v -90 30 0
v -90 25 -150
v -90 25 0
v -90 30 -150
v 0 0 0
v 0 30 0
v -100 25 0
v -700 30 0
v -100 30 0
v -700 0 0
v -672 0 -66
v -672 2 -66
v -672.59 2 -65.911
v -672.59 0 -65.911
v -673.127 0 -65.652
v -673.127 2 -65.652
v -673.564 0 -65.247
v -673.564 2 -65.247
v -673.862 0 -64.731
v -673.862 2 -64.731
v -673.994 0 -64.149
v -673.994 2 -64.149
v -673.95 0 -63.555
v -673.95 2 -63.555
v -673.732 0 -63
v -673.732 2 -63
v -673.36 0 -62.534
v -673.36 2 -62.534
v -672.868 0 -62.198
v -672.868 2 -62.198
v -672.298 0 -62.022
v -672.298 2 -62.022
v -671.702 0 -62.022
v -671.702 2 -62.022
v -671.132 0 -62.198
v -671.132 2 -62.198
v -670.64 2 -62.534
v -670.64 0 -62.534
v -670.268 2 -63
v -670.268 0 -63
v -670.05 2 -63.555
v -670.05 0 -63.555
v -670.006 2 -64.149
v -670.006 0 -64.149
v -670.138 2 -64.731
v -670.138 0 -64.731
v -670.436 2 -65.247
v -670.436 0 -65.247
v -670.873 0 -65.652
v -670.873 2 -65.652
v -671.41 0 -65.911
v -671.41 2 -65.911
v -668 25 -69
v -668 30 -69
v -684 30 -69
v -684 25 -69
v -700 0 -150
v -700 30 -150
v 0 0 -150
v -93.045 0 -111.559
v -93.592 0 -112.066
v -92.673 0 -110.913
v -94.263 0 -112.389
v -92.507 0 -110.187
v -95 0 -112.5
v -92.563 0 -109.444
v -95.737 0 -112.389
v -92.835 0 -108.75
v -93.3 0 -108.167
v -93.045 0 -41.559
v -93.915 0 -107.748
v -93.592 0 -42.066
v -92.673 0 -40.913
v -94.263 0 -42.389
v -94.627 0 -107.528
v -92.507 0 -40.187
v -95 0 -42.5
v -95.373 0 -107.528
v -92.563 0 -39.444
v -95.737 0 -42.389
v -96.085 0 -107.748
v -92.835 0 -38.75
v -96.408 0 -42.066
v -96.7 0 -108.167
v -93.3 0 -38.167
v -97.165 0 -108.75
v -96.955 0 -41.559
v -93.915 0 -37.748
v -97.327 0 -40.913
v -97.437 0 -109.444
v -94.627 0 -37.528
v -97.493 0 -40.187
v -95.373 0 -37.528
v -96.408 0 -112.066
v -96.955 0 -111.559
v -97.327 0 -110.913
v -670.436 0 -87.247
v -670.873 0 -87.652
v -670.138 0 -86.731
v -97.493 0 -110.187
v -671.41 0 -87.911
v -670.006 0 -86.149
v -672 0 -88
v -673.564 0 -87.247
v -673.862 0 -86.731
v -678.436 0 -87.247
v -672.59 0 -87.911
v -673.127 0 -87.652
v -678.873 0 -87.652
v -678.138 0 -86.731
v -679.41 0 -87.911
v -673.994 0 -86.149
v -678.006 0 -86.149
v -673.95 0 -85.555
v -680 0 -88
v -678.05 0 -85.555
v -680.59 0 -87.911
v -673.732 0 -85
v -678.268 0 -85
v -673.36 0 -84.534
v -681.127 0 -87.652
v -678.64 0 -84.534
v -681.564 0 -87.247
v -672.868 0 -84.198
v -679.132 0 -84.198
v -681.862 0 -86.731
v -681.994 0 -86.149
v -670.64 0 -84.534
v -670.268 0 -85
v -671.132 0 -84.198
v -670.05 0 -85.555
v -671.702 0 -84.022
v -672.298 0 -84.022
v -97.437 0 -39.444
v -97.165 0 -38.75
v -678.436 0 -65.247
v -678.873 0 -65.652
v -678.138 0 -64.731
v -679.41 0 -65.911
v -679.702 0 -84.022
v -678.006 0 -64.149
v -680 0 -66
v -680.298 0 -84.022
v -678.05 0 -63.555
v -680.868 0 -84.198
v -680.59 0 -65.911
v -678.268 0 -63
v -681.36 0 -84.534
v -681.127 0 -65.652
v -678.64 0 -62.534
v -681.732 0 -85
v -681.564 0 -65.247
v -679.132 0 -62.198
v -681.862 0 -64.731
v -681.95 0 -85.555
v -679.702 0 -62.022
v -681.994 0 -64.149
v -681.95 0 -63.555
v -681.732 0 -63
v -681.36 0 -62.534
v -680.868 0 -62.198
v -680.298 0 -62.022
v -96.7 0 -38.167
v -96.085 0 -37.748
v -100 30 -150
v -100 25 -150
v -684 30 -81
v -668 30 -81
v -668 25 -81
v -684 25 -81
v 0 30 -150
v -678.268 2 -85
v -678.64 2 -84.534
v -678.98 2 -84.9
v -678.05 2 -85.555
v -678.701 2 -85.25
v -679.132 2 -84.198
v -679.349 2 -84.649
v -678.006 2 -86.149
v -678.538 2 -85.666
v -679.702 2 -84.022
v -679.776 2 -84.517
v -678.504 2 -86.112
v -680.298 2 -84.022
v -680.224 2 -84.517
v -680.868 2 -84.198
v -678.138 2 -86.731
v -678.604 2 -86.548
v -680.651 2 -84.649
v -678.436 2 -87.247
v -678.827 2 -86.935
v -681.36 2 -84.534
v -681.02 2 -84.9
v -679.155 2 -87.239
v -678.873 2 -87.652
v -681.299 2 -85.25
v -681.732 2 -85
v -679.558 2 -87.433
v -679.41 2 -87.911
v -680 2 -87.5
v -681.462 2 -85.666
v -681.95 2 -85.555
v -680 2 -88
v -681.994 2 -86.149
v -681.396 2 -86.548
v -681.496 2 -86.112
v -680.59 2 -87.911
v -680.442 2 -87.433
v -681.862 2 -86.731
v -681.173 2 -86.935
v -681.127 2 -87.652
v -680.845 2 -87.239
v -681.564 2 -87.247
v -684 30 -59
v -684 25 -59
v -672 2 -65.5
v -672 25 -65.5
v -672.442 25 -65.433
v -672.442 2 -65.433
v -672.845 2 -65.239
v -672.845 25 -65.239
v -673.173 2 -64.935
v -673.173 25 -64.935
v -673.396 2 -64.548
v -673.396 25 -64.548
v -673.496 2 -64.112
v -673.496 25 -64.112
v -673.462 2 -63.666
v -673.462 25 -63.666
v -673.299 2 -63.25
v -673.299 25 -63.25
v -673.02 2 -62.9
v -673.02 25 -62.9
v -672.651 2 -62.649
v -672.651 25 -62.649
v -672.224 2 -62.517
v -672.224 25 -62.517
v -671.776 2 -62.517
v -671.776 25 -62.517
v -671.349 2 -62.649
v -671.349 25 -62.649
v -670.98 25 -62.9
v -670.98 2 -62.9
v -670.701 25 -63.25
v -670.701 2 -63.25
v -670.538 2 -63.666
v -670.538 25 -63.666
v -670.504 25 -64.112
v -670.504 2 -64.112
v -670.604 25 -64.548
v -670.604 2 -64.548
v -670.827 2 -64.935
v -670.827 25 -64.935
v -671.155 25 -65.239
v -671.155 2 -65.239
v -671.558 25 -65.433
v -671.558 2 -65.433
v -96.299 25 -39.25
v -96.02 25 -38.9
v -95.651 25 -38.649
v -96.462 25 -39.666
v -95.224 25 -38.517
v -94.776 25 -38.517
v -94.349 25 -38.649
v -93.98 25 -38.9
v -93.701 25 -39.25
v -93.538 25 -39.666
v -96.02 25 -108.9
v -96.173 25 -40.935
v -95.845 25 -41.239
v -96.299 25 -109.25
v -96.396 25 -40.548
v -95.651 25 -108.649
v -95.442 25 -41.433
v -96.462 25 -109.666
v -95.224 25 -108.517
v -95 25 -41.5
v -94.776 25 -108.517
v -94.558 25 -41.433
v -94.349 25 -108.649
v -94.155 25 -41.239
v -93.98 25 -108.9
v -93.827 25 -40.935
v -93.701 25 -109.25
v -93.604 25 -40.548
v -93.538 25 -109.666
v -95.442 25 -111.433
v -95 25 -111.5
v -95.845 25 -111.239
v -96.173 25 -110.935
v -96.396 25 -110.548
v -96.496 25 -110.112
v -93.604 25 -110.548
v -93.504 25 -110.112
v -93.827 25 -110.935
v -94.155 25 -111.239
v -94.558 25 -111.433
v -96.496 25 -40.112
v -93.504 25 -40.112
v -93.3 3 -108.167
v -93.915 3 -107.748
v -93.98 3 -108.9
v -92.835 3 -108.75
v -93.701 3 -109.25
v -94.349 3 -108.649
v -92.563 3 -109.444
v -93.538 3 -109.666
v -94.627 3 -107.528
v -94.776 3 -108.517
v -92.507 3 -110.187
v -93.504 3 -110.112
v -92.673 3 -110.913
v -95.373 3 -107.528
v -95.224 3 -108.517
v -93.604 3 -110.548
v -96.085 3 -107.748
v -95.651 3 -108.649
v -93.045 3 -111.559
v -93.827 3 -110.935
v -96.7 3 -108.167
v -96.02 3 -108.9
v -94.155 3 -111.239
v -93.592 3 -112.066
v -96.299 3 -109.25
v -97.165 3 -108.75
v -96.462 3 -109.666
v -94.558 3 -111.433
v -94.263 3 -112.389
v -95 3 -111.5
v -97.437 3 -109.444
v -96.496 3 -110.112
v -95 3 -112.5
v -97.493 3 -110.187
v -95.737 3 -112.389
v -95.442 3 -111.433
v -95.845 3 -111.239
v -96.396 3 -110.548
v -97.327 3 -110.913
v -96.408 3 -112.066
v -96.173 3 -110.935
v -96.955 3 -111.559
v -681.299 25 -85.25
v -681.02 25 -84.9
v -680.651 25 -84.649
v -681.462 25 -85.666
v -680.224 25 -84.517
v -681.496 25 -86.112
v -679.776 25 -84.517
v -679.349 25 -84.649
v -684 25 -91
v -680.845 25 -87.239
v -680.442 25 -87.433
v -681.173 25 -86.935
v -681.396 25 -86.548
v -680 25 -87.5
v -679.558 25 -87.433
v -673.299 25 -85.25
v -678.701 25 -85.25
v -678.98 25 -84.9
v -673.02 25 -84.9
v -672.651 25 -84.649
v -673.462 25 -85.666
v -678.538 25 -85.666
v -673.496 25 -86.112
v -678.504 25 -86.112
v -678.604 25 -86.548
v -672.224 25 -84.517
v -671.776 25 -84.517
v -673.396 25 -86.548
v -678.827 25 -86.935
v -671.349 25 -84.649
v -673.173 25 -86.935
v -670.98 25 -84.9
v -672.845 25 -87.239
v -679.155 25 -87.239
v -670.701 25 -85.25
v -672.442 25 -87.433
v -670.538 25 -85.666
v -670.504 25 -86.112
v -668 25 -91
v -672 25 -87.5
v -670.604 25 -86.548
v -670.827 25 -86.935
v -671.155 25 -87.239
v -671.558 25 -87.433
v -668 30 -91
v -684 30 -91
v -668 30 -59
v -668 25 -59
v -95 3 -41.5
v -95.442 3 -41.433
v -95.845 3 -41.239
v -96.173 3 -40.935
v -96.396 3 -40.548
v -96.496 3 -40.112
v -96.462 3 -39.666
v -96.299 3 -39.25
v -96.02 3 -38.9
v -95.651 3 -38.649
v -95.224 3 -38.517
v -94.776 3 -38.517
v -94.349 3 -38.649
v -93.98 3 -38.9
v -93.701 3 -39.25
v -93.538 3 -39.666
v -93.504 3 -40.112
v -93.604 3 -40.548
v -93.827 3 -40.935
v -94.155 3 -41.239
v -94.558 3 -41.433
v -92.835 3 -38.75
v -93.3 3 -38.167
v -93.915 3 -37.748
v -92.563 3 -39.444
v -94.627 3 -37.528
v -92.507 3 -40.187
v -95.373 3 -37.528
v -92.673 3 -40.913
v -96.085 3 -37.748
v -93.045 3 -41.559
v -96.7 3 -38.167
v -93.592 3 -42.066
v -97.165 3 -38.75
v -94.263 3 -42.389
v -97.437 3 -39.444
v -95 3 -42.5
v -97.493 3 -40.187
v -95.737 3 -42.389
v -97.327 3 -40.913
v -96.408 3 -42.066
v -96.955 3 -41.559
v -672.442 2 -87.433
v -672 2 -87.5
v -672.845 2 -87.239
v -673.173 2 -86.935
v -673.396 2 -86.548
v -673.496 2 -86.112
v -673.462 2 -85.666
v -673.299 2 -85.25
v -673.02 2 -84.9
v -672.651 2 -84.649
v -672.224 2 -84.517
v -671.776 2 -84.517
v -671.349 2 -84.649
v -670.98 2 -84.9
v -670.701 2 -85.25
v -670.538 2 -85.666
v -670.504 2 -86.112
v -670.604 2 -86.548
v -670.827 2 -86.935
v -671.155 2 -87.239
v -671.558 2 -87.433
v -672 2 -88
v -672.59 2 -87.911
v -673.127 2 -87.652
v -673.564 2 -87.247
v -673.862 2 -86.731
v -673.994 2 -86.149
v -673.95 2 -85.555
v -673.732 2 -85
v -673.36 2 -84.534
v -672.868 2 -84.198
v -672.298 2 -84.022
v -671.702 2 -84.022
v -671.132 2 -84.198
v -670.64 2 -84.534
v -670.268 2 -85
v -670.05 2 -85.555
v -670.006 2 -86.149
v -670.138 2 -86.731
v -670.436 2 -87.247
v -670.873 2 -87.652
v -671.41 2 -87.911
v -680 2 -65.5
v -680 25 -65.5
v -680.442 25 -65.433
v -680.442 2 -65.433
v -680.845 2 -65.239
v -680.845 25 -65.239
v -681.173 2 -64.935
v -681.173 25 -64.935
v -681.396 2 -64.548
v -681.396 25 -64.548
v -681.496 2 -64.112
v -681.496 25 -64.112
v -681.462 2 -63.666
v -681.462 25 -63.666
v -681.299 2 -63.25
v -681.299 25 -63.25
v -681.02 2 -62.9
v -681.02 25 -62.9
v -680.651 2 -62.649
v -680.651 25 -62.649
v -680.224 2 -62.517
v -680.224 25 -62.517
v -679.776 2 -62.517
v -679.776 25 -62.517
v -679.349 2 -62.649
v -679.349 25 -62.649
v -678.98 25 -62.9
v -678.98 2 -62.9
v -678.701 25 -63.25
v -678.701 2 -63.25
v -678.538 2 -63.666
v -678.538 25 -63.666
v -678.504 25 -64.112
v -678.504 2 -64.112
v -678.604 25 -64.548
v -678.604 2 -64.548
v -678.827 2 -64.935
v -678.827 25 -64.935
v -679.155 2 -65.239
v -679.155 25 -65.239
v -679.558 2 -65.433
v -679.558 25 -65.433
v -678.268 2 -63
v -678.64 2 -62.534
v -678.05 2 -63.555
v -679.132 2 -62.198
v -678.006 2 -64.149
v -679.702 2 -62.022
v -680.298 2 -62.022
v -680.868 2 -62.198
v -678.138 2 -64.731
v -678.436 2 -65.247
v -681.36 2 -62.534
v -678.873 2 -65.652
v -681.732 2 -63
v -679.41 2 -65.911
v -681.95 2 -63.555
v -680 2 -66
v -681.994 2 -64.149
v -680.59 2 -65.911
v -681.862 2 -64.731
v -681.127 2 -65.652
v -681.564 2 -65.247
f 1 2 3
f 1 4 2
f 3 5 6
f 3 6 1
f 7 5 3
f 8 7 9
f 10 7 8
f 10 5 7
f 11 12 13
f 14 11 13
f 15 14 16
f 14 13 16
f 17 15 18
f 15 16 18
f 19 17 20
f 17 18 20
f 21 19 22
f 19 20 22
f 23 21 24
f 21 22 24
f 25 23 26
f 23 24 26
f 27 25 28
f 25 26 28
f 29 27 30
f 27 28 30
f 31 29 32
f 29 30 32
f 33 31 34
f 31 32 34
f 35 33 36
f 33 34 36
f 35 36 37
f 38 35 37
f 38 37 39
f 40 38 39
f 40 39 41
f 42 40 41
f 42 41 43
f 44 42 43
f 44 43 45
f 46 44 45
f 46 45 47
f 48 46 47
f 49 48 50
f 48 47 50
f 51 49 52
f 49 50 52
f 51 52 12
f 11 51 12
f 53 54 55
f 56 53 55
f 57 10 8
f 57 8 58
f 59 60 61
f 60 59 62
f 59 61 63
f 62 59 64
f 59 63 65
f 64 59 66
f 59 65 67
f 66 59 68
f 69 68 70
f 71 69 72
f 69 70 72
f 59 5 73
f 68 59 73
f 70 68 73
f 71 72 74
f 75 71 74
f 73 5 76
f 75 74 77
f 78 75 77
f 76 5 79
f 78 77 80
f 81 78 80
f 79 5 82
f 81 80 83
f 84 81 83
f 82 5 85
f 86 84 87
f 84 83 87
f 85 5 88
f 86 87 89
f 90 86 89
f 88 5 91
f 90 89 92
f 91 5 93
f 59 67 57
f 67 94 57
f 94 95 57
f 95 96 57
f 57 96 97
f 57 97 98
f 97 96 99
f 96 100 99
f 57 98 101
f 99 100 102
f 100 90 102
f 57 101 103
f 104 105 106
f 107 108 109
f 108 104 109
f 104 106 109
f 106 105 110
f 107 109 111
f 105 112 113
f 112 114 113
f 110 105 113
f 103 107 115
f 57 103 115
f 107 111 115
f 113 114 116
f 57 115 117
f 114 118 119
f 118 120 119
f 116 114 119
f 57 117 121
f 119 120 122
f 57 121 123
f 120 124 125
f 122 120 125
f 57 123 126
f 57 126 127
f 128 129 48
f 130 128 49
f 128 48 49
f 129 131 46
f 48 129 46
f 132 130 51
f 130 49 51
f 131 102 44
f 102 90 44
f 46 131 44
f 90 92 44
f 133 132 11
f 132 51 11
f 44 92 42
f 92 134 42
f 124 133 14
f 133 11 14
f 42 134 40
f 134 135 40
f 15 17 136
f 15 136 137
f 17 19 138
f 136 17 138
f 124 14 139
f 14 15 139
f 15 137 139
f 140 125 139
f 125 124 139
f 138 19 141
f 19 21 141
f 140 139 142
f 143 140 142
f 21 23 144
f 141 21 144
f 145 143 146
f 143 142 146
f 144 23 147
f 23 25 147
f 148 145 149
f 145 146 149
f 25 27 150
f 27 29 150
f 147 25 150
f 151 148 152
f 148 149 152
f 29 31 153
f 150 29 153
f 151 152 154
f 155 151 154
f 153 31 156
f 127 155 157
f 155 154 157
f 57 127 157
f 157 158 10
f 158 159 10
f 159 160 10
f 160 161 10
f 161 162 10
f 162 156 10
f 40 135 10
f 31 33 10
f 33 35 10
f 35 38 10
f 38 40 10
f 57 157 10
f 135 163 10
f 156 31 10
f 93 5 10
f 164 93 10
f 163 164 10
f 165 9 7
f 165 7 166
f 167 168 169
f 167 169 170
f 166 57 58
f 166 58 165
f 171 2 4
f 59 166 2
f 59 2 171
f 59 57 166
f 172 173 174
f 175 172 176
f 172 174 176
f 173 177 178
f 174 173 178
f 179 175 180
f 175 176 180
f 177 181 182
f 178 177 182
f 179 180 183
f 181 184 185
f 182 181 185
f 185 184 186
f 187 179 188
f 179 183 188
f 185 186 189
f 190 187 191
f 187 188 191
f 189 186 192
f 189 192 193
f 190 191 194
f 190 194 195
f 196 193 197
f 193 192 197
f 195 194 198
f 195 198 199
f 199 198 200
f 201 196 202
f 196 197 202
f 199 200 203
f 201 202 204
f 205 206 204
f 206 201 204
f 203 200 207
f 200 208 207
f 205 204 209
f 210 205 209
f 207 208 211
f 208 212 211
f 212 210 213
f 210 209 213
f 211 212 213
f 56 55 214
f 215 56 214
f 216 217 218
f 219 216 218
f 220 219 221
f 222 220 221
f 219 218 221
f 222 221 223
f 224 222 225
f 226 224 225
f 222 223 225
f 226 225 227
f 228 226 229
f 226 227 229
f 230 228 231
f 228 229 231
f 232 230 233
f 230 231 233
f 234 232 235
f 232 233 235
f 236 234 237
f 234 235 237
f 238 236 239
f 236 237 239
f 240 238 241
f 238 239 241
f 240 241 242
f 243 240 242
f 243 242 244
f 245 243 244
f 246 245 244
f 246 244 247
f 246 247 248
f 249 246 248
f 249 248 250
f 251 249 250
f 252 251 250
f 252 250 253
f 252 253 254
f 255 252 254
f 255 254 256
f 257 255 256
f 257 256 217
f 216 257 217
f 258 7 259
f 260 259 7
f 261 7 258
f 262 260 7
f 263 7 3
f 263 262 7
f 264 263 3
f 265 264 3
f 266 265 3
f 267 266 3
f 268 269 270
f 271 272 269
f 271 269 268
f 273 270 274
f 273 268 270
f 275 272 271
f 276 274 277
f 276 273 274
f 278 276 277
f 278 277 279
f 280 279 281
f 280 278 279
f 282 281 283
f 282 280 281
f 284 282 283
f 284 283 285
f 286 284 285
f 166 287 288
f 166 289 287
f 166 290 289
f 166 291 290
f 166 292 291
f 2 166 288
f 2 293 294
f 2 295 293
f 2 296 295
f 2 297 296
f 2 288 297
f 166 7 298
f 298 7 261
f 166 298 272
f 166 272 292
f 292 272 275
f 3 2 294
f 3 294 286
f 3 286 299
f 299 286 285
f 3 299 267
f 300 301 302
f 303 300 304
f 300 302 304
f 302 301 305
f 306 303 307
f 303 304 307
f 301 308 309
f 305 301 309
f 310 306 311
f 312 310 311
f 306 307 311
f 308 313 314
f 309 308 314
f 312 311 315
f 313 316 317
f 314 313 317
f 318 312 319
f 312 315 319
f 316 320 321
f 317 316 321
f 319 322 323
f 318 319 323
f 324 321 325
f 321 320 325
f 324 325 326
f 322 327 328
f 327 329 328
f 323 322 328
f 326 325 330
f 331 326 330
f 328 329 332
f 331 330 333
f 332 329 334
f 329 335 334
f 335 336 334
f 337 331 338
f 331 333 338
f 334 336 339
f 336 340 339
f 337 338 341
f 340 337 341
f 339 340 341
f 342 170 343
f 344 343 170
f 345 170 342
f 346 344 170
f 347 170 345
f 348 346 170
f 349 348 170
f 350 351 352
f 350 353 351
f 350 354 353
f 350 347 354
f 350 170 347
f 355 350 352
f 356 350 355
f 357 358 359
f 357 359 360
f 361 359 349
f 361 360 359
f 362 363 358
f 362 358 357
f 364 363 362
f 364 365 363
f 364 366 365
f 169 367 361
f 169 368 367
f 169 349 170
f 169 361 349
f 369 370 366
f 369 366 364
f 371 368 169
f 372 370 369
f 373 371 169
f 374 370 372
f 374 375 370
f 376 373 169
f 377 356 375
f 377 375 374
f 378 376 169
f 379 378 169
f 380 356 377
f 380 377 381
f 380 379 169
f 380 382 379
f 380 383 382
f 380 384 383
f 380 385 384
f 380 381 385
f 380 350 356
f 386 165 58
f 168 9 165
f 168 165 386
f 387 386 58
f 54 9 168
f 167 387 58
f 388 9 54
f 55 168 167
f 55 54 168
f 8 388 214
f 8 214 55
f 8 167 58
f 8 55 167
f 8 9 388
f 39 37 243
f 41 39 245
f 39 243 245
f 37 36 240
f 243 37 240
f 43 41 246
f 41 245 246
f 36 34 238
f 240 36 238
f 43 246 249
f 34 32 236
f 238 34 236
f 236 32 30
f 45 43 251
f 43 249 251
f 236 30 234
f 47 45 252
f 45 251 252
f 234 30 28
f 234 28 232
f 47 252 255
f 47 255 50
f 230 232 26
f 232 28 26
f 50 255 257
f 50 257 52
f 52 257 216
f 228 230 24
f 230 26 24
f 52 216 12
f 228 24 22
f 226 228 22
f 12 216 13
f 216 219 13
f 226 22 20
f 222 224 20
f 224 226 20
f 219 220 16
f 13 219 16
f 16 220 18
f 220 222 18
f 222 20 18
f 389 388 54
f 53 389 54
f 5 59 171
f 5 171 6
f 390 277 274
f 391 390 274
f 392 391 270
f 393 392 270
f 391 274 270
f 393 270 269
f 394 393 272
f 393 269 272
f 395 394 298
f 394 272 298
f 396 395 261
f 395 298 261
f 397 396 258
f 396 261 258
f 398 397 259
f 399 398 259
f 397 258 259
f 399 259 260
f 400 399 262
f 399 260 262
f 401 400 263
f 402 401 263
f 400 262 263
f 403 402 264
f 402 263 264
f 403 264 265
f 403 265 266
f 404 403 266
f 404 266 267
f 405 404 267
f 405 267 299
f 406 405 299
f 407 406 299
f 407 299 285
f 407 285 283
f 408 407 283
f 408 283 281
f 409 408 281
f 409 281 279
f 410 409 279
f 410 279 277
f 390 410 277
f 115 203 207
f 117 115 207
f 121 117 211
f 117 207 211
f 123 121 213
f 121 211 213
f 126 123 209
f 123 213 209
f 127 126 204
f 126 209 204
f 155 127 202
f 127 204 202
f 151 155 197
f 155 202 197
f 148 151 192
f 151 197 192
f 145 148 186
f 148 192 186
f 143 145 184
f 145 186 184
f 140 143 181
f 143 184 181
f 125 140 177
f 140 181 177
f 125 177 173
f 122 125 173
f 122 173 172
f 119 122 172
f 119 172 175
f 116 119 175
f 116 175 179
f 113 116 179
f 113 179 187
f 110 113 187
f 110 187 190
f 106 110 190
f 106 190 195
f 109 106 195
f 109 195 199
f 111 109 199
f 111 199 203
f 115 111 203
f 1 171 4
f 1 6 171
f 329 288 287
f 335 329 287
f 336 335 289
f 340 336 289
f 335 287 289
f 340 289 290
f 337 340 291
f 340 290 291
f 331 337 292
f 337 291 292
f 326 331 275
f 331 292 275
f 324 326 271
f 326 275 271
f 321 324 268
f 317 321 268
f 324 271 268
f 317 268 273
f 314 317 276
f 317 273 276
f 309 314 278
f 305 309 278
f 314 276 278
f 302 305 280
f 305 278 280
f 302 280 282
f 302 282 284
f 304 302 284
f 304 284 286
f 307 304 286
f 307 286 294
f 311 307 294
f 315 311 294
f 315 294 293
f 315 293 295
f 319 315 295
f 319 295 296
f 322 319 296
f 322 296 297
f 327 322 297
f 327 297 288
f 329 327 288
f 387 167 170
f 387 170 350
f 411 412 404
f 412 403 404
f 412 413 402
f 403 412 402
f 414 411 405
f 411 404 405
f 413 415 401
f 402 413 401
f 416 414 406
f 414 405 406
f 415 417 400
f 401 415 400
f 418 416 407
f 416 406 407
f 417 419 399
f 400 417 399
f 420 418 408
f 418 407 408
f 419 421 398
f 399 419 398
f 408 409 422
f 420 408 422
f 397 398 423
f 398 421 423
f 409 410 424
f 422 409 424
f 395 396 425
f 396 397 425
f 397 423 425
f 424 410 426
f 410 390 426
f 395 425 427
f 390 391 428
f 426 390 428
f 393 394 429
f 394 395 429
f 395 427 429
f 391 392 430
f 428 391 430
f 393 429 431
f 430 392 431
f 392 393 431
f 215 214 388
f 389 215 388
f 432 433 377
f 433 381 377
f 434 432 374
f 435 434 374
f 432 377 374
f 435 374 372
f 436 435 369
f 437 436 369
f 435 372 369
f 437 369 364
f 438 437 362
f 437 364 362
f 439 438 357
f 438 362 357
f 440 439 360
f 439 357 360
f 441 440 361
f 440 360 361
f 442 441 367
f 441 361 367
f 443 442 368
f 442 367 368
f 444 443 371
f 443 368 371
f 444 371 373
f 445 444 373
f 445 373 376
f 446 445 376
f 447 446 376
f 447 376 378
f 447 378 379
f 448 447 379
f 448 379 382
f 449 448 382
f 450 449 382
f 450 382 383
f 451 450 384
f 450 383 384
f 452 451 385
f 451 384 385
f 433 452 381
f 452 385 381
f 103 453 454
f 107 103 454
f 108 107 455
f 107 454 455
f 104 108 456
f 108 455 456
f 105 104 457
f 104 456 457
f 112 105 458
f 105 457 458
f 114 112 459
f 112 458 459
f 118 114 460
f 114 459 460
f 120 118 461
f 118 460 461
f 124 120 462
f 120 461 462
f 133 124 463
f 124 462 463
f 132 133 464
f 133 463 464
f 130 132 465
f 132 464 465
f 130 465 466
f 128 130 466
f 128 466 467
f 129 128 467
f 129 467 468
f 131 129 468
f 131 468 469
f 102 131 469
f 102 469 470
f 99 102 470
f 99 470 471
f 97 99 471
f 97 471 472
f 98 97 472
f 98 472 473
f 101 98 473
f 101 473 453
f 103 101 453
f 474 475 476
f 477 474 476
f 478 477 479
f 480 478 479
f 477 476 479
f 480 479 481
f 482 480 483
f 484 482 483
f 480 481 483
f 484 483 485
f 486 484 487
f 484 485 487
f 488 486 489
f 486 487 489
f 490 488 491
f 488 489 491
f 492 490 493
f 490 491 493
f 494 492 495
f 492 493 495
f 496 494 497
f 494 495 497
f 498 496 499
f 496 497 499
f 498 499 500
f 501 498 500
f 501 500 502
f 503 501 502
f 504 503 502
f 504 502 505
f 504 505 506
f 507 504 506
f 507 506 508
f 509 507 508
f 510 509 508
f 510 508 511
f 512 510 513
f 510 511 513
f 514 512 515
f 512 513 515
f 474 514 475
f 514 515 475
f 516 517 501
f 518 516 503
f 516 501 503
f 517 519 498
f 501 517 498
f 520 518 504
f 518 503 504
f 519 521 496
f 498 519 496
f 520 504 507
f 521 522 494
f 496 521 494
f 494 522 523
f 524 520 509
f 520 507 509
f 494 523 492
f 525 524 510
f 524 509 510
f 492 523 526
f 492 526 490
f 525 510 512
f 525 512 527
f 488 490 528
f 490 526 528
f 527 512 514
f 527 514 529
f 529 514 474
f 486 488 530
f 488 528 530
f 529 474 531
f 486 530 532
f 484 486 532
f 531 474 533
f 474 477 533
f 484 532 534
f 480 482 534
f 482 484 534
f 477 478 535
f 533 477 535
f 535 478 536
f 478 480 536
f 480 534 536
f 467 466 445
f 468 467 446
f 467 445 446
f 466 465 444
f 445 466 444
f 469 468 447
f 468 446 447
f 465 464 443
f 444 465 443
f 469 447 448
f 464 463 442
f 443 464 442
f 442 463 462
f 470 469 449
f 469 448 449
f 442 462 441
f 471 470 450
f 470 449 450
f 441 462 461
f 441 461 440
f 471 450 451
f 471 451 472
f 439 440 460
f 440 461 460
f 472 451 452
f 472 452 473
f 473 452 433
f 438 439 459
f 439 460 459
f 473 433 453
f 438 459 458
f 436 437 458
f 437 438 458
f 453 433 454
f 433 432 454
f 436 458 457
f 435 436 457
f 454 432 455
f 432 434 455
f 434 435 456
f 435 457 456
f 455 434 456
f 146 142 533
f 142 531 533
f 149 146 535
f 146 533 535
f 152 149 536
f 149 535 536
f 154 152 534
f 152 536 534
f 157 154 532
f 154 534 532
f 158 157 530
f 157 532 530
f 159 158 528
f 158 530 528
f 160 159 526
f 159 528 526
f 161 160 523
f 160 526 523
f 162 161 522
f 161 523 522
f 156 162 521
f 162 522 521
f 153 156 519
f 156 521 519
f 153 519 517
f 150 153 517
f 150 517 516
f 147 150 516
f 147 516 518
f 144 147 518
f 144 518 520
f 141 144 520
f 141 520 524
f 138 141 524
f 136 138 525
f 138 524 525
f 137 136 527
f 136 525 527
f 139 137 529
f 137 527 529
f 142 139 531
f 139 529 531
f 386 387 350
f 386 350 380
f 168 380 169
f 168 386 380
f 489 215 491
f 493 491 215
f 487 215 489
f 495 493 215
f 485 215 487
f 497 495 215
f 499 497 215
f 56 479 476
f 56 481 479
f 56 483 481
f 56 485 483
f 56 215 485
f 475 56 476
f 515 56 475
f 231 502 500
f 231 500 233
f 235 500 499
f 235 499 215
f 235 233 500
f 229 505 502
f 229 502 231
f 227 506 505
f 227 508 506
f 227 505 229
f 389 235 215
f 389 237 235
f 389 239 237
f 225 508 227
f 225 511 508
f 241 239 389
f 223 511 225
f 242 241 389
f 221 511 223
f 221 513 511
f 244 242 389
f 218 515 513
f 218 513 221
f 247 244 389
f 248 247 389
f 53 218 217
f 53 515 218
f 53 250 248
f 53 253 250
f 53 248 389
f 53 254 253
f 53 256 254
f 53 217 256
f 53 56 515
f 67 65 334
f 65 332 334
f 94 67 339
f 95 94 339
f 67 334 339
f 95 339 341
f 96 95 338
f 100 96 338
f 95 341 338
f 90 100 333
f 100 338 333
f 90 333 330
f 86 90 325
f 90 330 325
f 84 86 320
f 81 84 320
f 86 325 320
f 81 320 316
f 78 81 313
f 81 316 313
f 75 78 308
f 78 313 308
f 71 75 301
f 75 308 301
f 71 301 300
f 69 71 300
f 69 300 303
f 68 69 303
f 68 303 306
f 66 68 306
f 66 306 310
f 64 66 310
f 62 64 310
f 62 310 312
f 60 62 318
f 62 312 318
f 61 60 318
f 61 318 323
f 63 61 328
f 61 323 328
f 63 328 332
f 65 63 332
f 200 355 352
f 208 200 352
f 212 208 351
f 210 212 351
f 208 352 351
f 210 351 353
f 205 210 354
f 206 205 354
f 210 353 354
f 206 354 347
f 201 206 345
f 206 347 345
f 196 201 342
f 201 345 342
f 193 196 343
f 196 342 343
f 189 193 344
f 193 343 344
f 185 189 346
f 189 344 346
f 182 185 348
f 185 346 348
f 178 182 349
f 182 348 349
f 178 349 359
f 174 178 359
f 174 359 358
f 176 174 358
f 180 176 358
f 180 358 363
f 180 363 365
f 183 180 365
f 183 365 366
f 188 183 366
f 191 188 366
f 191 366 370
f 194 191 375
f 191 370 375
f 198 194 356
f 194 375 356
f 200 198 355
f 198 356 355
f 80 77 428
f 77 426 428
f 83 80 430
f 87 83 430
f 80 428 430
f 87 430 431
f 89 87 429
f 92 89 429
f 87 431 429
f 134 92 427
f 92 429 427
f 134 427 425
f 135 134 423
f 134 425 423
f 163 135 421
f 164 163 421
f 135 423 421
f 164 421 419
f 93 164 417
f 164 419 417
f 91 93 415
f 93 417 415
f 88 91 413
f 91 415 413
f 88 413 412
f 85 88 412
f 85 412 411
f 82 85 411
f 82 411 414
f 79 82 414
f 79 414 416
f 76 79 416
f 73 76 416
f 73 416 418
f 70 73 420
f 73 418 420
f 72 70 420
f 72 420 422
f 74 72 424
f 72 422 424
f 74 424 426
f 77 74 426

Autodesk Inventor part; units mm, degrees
ref_plane "YZ Plane" through (0, 0, 0) normal (1, 0, 0) x (0, 1, 0)
ref_plane "XZ Plane" through (0, 0, 0) normal (0, 1, 0) x (-1, 0, 0)
ref_plane "XY Plane" through (0, 0, 0) normal (0, 0, 1) x (1, 0, 0)
sketch "Sketch1" plane through (0, 0, 0) normal (0, 1, 0) x (-1, 0, 0)
  line L0 (0, 0) -> (700, 0)
  line L1 (700, 0) -> (700, -150)
  line L2 (700, -150) -> (0, -150)
  line L3 (0, -150) -> (0, 0)
  dimension "d0" = 700
  dimension "d1" = 150
extrude "Extrusion1" add sketch "Sketch1" along normal blind 30
sketch "Sketch2" plane through (0, 30, 0) normal (0, 1, 0) x (1, 0, 0)
  line L0 (-684, 59) -> (-668, 59)
  line L1 (-668, 59) -> (-668, 69)
  line L2 (-668, 69) -> (-684, 69)
  line L3 (-684, 69) -> (-684, 59)
  line L4 (-700, 150) -> (-700, 0) projected
  line L5 (-700, 75) -> (-334.1666, 75) construction
  line L6 (-684, 91) -> (-668, 91)
  line L7 (-668, 91) -> (-668, 81)
  line L8 (-668, 81) -> (-684, 81)
  line L9 (-684, 81) -> (-684, 91)
  point P0 (0, 0)
  dimension "d4" = 6
  dimension "d5" = 16
  dimension "d6" = 16
  dimension "d7" = 10
extrude "Extrusion2" cut sketch "Sketch2" against normal blind 5
sketch "Sketch4" plane through (0, 30, 0) normal (0, 1, 0) x (1, 0, 0)
  line L0 (-100, 150) -> (-90, 150)
  line L1 (-90, 150) -> (-90, 0)
  line L2 (-90, 0) -> (-100, 0)
  line L3 (-100, 0) -> (-100, 150)
  line L4 (-700, 150) -> (-700, 0) projected
  line L5 (0, 150) -> (-700, 150) projected
  point P0 (0, 0)
  dimension "d10" = 600
  dimension "d11" = 10
  dimension "d14" = 0
extrude "Extrusion3" cut sketch "Sketch4" against normal blind 5
sketch "Sketch5" plane through (0, 0, 0) normal (0, -1, 0) x (1, 0, 0)
  line L0 (-90, -150) -> (-90, 0) projected
  line L1 (-700, -150) -> (0, -150) projected
  line L2 (0, 0) -> (-700, 0) projected
  point P0 (-95, -40)
  point P1 (-95, -110)
  dimension "d15" = 5
  dimension "d16" = 5
  dimension "d17" = 40
  dimension "d18" = 40
hole "Hole1" at (-95, 0, -40) at (-95, 0, -110) direction (0, 1, 0) diameter 3 end through all counterbore diameter 5 counterbore depth 3
sketch "Sketch6" plane through (0, 0, 0) normal (0, -1, 0) x (1, 0, 0)
  line L0 (-668, -59) -> (-684, -59) projected
  line L1 (-684, -69) -> (-668, -69) projected
  line L2 (-668, -81) -> (-684, -81) projected
  line L3 (-684, -91) -> (-668, -91) projected
  line L4 (-684, -81) -> (-684, -91) projected
  line L5 (-668, -91) -> (-668, -81) projected
  line L6 (-684, -59) -> (-684, -69) projected
  line L7 (-668, -69) -> (-668, -59) projected
  point P0 (0, 0)
  point P1 (-680, -86)
  point P2 (-672, -86)
  point P3 (-672, -64)
  point P4 (-680, -64)
  dimension "d26" = 5
  dimension "d27" = 5
  dimension "d28" = 5
  dimension "d29" = 5
  dimension "d30" = 4
  dimension "d31" = 4
  dimension "d32" = 4
  dimension "d33" = 4
hole "Hole2" at (-680, 0, -86) at (-672, 0, -86) at (-672, 0, -64) at (-680, 0, -64) direction (0, 1, 0) diameter 3 end through all counterbore diameter 4 counterbore depth 2
properties part number "Base"
